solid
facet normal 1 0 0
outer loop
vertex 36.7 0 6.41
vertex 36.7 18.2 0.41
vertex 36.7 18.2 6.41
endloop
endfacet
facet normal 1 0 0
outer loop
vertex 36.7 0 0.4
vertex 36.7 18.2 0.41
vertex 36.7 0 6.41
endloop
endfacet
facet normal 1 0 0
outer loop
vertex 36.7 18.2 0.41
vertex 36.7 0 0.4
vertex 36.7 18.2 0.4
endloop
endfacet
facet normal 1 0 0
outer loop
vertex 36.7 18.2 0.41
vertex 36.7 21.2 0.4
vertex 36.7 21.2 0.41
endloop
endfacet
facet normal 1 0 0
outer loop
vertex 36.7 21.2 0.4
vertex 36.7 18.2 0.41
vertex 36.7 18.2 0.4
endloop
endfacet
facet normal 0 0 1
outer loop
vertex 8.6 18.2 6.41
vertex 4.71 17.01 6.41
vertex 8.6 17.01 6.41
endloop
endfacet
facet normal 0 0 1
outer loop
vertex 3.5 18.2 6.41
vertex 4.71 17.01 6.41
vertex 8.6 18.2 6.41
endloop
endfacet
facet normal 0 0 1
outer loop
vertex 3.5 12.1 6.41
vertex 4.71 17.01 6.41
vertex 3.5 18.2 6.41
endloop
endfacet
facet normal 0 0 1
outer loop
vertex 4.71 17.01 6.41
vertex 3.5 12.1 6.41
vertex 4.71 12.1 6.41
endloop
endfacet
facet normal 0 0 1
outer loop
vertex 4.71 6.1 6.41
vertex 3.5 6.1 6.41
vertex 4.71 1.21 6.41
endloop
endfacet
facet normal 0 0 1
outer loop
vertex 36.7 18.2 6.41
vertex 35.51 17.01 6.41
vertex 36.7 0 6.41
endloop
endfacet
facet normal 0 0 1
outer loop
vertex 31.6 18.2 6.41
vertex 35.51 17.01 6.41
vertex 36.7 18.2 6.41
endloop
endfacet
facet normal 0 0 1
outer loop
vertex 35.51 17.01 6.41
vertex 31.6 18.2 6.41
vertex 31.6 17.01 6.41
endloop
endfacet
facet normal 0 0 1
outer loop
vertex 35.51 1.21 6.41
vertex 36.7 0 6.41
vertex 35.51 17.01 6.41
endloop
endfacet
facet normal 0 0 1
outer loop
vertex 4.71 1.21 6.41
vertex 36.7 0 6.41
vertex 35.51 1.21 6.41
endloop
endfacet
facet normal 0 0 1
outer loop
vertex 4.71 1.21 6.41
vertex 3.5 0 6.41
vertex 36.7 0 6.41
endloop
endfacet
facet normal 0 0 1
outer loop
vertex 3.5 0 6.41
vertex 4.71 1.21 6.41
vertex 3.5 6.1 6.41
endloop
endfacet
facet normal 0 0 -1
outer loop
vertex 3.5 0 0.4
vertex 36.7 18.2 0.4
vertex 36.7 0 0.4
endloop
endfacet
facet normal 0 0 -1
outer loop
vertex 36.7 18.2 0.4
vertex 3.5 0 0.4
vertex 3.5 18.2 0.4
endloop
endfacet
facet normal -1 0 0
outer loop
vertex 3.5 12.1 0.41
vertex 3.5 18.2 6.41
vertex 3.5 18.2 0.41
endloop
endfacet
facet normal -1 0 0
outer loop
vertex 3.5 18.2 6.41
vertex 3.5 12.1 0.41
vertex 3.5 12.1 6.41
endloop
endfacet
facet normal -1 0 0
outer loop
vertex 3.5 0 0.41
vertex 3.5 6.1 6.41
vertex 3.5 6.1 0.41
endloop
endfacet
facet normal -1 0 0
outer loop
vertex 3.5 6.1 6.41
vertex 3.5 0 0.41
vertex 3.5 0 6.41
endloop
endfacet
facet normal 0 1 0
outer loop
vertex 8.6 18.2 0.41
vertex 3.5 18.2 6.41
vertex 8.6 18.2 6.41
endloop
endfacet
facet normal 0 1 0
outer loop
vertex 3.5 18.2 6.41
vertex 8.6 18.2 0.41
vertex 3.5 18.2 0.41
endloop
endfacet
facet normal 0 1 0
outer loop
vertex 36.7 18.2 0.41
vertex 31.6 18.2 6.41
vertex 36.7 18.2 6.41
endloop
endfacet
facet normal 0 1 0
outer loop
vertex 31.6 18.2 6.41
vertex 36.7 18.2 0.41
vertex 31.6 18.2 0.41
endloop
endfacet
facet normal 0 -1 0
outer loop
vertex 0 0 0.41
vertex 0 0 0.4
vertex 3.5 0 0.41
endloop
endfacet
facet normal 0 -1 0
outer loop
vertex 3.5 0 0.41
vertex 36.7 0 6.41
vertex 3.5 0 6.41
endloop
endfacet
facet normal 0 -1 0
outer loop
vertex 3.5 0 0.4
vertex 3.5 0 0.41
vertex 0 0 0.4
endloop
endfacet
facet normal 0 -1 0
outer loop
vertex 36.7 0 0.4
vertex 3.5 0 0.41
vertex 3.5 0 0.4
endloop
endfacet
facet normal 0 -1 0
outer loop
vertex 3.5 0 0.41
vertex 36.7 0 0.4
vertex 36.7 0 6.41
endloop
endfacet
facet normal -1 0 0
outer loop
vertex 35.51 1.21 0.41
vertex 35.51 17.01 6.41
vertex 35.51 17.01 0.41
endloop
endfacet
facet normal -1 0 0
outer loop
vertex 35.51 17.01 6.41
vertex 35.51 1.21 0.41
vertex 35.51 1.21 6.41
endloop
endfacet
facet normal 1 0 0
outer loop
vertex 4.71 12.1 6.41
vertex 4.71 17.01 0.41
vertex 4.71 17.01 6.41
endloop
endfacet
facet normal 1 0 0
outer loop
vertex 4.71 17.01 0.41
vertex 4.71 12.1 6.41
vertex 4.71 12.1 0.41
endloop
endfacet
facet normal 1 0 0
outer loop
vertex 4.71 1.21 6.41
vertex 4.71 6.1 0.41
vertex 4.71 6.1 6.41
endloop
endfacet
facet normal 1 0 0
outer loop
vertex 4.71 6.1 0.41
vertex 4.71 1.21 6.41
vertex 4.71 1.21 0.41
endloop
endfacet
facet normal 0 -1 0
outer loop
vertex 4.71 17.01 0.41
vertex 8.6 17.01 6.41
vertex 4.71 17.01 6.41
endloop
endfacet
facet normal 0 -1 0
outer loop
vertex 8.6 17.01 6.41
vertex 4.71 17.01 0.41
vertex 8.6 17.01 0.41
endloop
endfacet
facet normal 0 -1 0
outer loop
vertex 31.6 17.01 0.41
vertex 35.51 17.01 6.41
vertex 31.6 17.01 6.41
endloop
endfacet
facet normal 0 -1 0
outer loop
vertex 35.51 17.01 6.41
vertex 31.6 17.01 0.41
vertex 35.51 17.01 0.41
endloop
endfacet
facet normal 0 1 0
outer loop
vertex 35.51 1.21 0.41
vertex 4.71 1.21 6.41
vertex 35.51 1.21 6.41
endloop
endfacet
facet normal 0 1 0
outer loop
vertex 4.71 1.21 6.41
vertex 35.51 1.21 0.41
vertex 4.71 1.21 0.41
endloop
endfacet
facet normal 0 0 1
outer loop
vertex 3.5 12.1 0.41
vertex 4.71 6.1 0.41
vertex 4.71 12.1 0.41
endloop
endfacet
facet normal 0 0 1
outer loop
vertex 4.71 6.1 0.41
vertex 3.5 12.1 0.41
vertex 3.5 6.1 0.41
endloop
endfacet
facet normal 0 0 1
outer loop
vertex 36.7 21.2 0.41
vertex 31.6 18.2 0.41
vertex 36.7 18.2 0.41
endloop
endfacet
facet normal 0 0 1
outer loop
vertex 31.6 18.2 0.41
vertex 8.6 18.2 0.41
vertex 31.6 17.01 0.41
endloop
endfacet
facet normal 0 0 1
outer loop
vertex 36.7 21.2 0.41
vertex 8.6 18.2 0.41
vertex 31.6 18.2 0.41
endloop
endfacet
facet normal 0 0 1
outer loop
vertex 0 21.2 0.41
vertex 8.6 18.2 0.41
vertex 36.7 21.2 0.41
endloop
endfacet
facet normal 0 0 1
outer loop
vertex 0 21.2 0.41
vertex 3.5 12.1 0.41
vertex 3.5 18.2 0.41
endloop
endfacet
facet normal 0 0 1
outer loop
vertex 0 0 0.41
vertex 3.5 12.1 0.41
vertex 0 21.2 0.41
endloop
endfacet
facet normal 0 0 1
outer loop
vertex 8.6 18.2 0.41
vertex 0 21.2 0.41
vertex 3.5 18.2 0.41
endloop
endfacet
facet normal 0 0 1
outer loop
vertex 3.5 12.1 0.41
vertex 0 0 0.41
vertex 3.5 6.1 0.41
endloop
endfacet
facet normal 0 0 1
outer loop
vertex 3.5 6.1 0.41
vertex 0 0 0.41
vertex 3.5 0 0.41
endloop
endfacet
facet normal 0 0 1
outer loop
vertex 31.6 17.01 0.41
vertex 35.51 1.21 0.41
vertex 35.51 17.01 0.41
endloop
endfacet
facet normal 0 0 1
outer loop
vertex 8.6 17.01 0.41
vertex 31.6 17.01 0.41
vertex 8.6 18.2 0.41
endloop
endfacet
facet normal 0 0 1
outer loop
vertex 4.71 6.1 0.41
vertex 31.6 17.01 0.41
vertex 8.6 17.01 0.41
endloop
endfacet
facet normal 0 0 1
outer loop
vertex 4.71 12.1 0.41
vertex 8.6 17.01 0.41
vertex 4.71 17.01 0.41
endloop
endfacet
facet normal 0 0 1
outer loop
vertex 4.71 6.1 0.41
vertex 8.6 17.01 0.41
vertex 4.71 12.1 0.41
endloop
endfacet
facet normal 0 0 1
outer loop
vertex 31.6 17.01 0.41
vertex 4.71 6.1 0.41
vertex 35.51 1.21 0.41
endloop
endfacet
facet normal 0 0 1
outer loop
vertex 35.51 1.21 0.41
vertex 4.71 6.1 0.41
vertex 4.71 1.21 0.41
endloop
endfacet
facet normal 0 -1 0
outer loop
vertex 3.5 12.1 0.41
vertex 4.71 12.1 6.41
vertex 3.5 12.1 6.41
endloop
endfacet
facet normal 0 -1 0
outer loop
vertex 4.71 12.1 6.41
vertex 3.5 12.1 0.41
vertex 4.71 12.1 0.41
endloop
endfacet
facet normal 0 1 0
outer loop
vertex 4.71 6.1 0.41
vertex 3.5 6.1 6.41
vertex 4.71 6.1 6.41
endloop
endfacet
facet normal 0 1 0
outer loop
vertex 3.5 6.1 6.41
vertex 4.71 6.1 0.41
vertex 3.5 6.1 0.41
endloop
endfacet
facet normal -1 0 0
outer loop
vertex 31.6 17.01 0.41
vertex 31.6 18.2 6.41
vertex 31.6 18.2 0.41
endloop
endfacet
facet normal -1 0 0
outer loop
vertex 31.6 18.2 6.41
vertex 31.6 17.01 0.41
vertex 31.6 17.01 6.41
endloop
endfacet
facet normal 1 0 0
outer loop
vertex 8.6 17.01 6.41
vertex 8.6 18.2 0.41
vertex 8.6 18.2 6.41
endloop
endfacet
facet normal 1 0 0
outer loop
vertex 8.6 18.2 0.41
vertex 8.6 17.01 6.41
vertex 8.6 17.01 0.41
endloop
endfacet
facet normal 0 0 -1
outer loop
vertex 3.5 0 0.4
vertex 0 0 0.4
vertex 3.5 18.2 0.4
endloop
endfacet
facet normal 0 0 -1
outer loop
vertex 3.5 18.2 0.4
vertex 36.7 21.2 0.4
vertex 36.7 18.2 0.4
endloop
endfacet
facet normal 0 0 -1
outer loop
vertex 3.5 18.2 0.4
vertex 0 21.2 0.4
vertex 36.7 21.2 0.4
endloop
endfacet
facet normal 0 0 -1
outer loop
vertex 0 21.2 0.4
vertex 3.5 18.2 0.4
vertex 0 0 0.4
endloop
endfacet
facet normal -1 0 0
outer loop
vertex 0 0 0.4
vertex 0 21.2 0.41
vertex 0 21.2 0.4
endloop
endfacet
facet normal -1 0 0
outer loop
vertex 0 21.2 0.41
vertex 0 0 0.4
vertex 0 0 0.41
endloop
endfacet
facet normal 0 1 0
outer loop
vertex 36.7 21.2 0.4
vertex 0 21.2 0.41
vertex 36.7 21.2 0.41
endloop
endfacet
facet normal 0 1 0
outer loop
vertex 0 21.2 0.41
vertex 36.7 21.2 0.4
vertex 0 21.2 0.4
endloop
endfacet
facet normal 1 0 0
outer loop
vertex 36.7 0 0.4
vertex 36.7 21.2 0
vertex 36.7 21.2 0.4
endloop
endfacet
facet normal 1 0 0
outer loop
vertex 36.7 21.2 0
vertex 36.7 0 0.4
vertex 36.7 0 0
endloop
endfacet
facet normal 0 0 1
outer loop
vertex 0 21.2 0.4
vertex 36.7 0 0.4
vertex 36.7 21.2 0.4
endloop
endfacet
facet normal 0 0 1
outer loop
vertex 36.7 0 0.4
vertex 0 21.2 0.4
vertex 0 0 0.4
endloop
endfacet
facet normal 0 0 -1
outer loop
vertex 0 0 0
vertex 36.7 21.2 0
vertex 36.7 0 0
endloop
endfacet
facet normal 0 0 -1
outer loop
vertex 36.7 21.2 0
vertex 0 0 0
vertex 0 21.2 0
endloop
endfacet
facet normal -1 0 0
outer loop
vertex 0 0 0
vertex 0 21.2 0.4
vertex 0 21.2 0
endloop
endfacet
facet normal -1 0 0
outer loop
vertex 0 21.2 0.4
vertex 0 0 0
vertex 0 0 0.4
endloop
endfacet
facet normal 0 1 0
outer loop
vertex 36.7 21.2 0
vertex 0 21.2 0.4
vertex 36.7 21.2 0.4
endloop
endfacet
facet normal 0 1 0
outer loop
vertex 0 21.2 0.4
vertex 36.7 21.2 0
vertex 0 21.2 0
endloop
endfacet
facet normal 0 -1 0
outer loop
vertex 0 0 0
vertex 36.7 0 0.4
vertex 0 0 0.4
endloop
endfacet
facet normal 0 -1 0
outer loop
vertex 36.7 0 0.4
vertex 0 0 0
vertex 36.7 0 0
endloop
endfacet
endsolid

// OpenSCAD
// file: ../../Base/Boxes.scad
// Fischertechnik Box Foundation
// Pre-designed Boxes

use <Constants.scad>

include <PlacementOptions.scad>

box190Width = 190;
box190Depth = 130;
box130Width = 130;
box130Depth = 95;

// Values are from an original ec3 box
topBottomDifference = 1.5;
outerHeight = 40;
baseThickness = 1.8;
innerHeight = outerHeight - baseThickness;
stackExcess = 5.7;
radius = 3.5;
wallThickness = 1.5;
tolerance = 0.2;

boxWallThickness = wallThickness;
boxBaseThickness = baseThickness;
boxWebWidth = 3.0;

// getBoxWallThickness()
// Gets the wall thickness of a Fischertechnik Box
function getBoxWallThickness() = boxWallThickness;

// getBoxUsageHeight(height = 38.2)
// Gets the usable height of a Fischertechnik box
// height = Outer height of the box from the bottom to the upper edge.
function getBoxUsageHeight(height = outerHeight) = height - baseThickness - stackExcess;

// getBoxInnerHeight()
// Gets the inner height of a Fischertechnik box, including the stack excess
function getBoxInnerHeight() = innerHeight;

// getBoxBaseThickness()
// Gets the thickness of the Fischertechnik box base.
function getBoxBaseThickness() = boxBaseThickness;

// getBoxWebWidth()
// Gets the width of a box web
function getBoxWebWidth() = boxWebWidth;

// getBox190Space()
// Gets the usable inner space of a Box 190 as an x/y-list
function getBox190Space() = [
    box190Width - 2*getBoxWallThickness() - topBottomDifference, 
    box190Depth - 2*getBoxWallThickness() - topBottomDifference ];

// RoundedCornerPlate(width, depth, height, radius)
// Creates a body plate with rounded corners for a box. Used
// also to create the complete box with the hull module.
// width = Width of the plate
// depth = depth of the plate 
// height = thickness of the plate
// radius = radius of the rounded corner
module RoundedCornerPlate(width, depth, height, radius) {
    translate([radius, radius])
    hull() {
        w = width-2*radius;
        d = depth-2*radius;
        cube([w, d, height]);
        cylinder(height, r=radius, $fn=getFragments());
        translate([w, 0])
            cylinder(height, r=radius, $fn=getFragments());
        translate([w, d])
            cylinder(height, r=radius, $fn=getFragments());
        translate([0, d])
            cylinder(height, r=radius, $fn=getFragments());
    }
}

// BoxBase(width, depth)
// Creates an empty stackable Fischertechnik compatible box
// width = Outer width of the box (190, 130, ...)
// depth = Outer depth of the box (130, 95, ...)

module BoxBase(width, depth, height=outerHeight) {    
    thinPlate = 0.01;

    innerHeight = height - baseThickness;    
    
    module Body(tolerance=tolerance) {
        hull() {
            // Bottom with tolerance to fit into the original boxes when stacked
            translate([-wallThickness+tolerance, -wallThickness+tolerance, -baseThickness])
                RoundedCornerPlate(width-topBottomDifference-2*tolerance, depth-topBottomDifference-2*tolerance, thinPlate, radius);
            
            // Top
            translate([-wallThickness-topBottomDifference/2, -wallThickness-topBottomDifference/2, innerHeight-thinPlate])
                RoundedCornerPlate(width, depth, thinPlate, radius);
         }
    }

    module Cutoff() {
        hull() {
            coWidth = width - 2*wallThickness;
            coDepth = depth - 2*wallThickness;
            
            // Bottom
            RoundedCornerPlate(coWidth-topBottomDifference, coDepth-topBottomDifference, thinPlate, radius);

            // Top
            translate([-topBottomDifference/2, -topBottomDifference/2, innerHeight+thinPlate]) 
                RoundedCornerPlate(coWidth, coDepth, thinPlate, radius);
        }
    }
    
    difference() {        
        Body();
        Cutoff();
        stackOffset = innerHeight - stackExcess;
        translate([0, 0, stackOffset + baseThickness])
            Body(tolerance=0);
    }
}

// Creates the Fischertechnik empty box 130x190 mm and places it at position 0,0
// 190x130 are the outer sizes, the inner space is slightly smaller. Use getBox190Space() to get the inner sizes.
// The box is positioned that the usable inner space is at the 0,0,0 position.

module Box190() {
    BoxBase(box190Width, box190Depth);
}

// Gets the usable inner space of a Box 130 as an x/y-list
function getBox130Space() = [
    box130Width - 2*getBoxWallThickness() - topBottomDifference, 
    box130Depth - 2*getBoxWallThickness() - topBottomDifference ];

// Creates the Fischertechnik empty box 95x130 mm and places it at position 0,0
// 190x130 are the outer sizes, the inner space is slightly smaller. Use getBox190Space() to get the inner sizes.
// The box is positioned that the usable inner space is at the 0,0,0 position.

module Box130() {
    BoxBase(box130Width, box130Depth);
}

// Creates a web at the specified box walls
// corner 0 = LowerLeft, 1 = UpperLeft, 2 = UpperRight, 3 = LowerRight
// side 0 = LeftOfCorner, 1 = RightOfCorner
// distance = Distance in mm from the corner
// boxSpace = inner width and depth of the box (default: Box 190)
// webWidth = length of the web (default is 3 mms)
// webThickness = thickness of the web (default is 1 mm)
// height = Height of the web (standard is getBoxUsageHeight())

module BoxWeb(corner, side, distance, boxSpace=getBox190Space(), webWidth=getBoxWebWidth(), webThickness=1.0, height=getBoxUsageHeight()) {
    sink = getBoxWallThickness()/2;

    width = (corner % 2 == 0) ? 
            (side == LeftOfCorner ? webWidth : webThickness) :
            (side == LeftOfCorner ? webThickness : webWidth);

    depth = (corner % 2 == 0) ? 
            (side == RightOfCorner ? webWidth : webThickness) :
            (side == RightOfCorner ? webThickness : webWidth);
    
    xDiff = corner == LowerLeft ? 
                (side == LeftOfCorner ? -sink : distance) :
            (corner == UpperLeft ?                
                (side == LeftOfCorner ? distance : -sink) :
            (corner == UpperRight ?
                (side == LeftOfCorner ? boxSpace.x-webWidth+sink : boxSpace.x-distance-webThickness) :
                (side == LeftOfCorner ? boxSpace.x-distance-webThickness: boxSpace.x-webWidth+sink)));

    yDiff = corner == LowerLeft ? 
                (side == RightOfCorner ? -sink : distance) :
            (corner == UpperLeft ?
                (side == RightOfCorner ? boxSpace.y-distance-webThickness : boxSpace.y-webWidth+sink) :
            (corner == UpperRight ?
                (side == RightOfCorner ? boxSpace.y-webWidth+sink : boxSpace.y-distance-webThickness) :
                (side == RightOfCorner ? distance : -sink)));
    
    translate([xDiff, yDiff, -getExcess()])
        cube([width, depth, height + 2*getExcess()]);
}
// file: ../../Base/Rotation.scad
// Fischertechnik Box Foundation
// Geometry Helpers Rotation

include <PlacementOptions.scad>

// getRotatedSpace(space, rotation=NoRotation)
// Rotates the space dependent on the specified rotation

function getRotatedSpace(space, rotation=NoRotation) = [
    (rotation == Rotate90 || rotation == Rotate270) ? space.y : space.x,
    (rotation == Rotate90 || rotation == Rotate270) ? space.x : space.y
];

// Rotates the given space around the fixed left lower corner
// space = the space the children needs as width/depth list [width,depth]
// rotation = 0 Rotate0 degrees, 1 Rotate90 degrees, 2 Rotate180 degrees, 3 Rotate270 degrees (equivalent to -90)

module RotateFix(space, rotation=NoRotation) {
    dy = (rotation == Rotate0 || rotation == Rotate270) ? 0 :
        (rotation == Rotate90) ? space.x :
        space.y;
    dx = (rotation < Rotate180) ? 0 :
        (rotation == Rotate180) ? space.x :
        space.y;
    
    translate([dx, dy, 0])
        rotate([0, 0, rotations[rotation]])
            children();
}
// file: ../../Base/Alignment.scad
// Fischertechnik Box Foundation
// Geometry Helpers Alignment

include <PlacementOptions.scad>

// getAlignedX(elementWidth, spaceWidth, align=AlignRight, offset=0)
// Gets the aligned X offset of an element with the given
// width in the given space.
// elementWidth = The width of the element to positon
// spaceWidth = The space where the element should be aligned
// align = 0 AlignLeft, 1 AlignCenter, 2 AlignRight
// offset = an optional offset from the aligned position. When
// aligned left or centered, then positive values are in X direction.
// When aligned right then positive values are in negative X direction.

function getAlignedX(elementWidth, spaceWidth, align=AlignRight, offset=0) =
    (align == AlignLeft) ?
        offset :
        ((align == AlignCenter) ?
        (spaceWidth - elementWidth)/2 + offset :
        spaceWidth - offset - elementWidth);

// getAlignedY(elementDepth, spaceDepth, align=AlignTop, offset=0)
// Gets the aligned Y offset of an element with the given
// depth in the given space.
// elementDepth = The depth of the element to positon
// spaceDepth = The space where the element should be aligned
// align = 0 AlignBottom, 1 AlignCenter, 2 AlignTop
// offset = an optional offset from the aligned position. When
// aligned bottom or centered, then positive values are in Y direction.
// When aligned top then positive values are in negative Y direction.

function getAlignedY(elementDepth, spaceDepth, align=AlignTop, offset=0) =
    (align == AlignBottom) ?
        offset :
        ((align == AlignCenter) ?
        (spaceDepth - elementDepth)/2 + offset :
        spaceDepth - offset - elementDepth);
// file: ../../Base/PlacementOptions.scad
// Fischertechnik Box Foundation
// Placement Options

// Alignment
NoAlign = 0;
AlignLeft = 1;
AlignBottom = 2;
AlignCenter = 3;
AlignRight = 4;
AlignTop = 5;

// Element rotation degree steps
rotations = [0, -90, -180, -270];

// Rotation
NoRotation = 0;
Rotate0 = 0;
Rotate90 = 1;
Rotate180 = 2;
Rotate270 = 3;

// Docking (seen from above)
NoDock = -1;
DockLeft = 0;
DockTop = 1;
DockRight = 2;
DockCorner = 2;
DockBottom = 3;

// Web corners
LowerLeft = 0;
UpperLeft = 1;
UpperRight = 2;
LowerRight = 3;

// Web position relative to corner
LeftOfCorner = 0;
RightOfCorner = 1;
// file: ../../Base/Placement.scad
// Fischertechnik Box Foundation
// Geometry Helpers Placement

use <Constants.scad>
use <Alignment.scad>
use <Rotation.scad>
use <Boxes.scad>

include <PlacementOptions.scad>

// Place(x=0, y=0, elementSpace=[0,0], alignX=AlignLeft, alignY=AlignBottom, rotation=Rotate0, boxSpace=getBox190Space())
// Places the child at the specified position
// y = Y-Position. This is a relative position when an X aligment is specified.
// x = X-Position. This is a relative position when an Y aligment is specified.
// elementSpace = space of the element to be placed [x,y]
// alignX = -1=NoAlign, 0 AlignLeft, 1 AlignCenter, 3 AlignRight (elementSpace and boxSpace required!)
// alignY = -1=NoAlign, 2 AlignBottom, 1 AlignCenter, 4 AlignTop (elementSpace and boxSpace required!)
// rotation = 0 Rotate0 0 degrees, 1 Rotate90 90 degrees, 
// 2 Rotate180 180 degrees, 3 Rotate270 270 degrees (equivalent to -90)
// boxSpace = Inner space of the box where the placement occurs [x,y] - default is Box 190x130 inner space

module Place(x=0, y=0, elementSpace=[0,0], 
  alignX=AlignLeft, alignY=AlignBottom, 
  rotation=NoRotation, boxSpace=getBox190Space()) {

    module Position(x, y, space, rotation=Rotate0) {
        translate([x, y, 0])
            RotateFix(space, rotation)
                children();
    }

    space = getRotatedSpace(elementSpace, rotation);
    alignedX = getAlignedX(space.x, boxSpace.x, alignX, x);
    alignedY = getAlignedY(space.y, boxSpace.y, alignY, y);
    Position(alignedX, alignedY, elementSpace, rotation)
        children();
}

// Center(space=getBox130Space(), elementSpace=[0,0])
// space = Space where the children is centered. For cylinder use centered=true and no elementSpace.
// elementSpace = space of the element to be centered [x,y]

module Center(space=getBox190Space(), elementSpace=[0,0]) {
    Place(elementSpace=elementSpace, boxSpace=space, alignX=AlignCenter, alignY=AlignCenter)
        children();
}

// CenterHorizontal(width=0, y=0, offset=0, space=getBox130Space())
// width = Width of the element to be placed.
// y = Y position of the element
// offset = Offset from the center position (negative will be left of the center)
// space = Space where the element is placed

module CenterHorizontal(width=0, y=0, offset=0, space=getBox190Space()) {
    Place(x=offset, y=y, elementSpace=[width, 0], boxSpace=space, alignX=AlignCenter)
        children(0);
}

// CenterVertical(depth=0, x=0, offset=0, space=getBox130Space())
// depth = Depth of the element to be placed.
// x = X position of the element
// offset = Offset from the center position (negative will be down of the center)
// space = Space where the element is placed

module CenterVertical(depth=0, x=0, offset=0, space=getBox190Space()) {
    Place(x=x, y=offset, elementSpace=[0, depth], boxSpace=space, alignY=AlignCenter)
        children(0);
}

// getIsVertical(align)
// True if the specified alignment needs a vertical orientation for a divider (AlignRight, AlignLeft)

function getIsVertical(align) = (align == AlignRight || align == AlignLeft);

// getIsHorizontal(align)
// True if the specified alignment needs a horizontal orientation for a divider (AlignTop, AlignBottom)

function getIsHorizontal(align) = (align == AlignTop || align == AlignBottom);
// file: ../../Elements/AxisClip10.scad
// Fischertechnik Box Library
// Axis for clip 10
// 31023

use <../ModelBase/Simple.scad>
use <../Base/Constants.scad>

/* [Element Parameters] */
height = 23;
clipHeight = 10;

/* [Hidden] */
width = 12;
depth = 12;
upperDiameter = 3.6;

// getAxisClip10Space()
// Gets the space of a n axis for a clip 10 with spring ring (mot2)

function getAxisClip10Space() = [width, depth, height];

// AxisClip10(height, clipHeight)
// Axis for clip 10 with spring ring (mot2)
// height = Height of the complete axis (standard is 23, in mot3 its only 12)
// clipHeight = Height of the part for the clip (standard is 10, in mot3 its only 7)

module AxisClip10(height=height, clipHeight=clipHeight) {
    LeveledAxisWithSpace(height, height-clipHeight, getAxisClip10Space(), diameter=upperDiameter);
}

// Test
color("lightgray")
AxisClip10(height, clipHeight);
// file: ../../Base/Constants.scad
// Fischertechnik Box Foundation
// Constants

// Constant values necessary for multiple elements

// Base constants
dividerThickness = 1.2;
excess = 0.01;
fragments = 90;
tolerance = 0.8;

// Gets the thickness of a divider 
function getDividerThickness() = dividerThickness;

// Gets the excess that is used to merge walls into each other
function getExcess() = excess;

// Gets amount of fragments of a cylinder
function getFragments() = fragments;

// Gets the inner tolerance of a frame to each side
function getTolerance() = tolerance;


// Fischertechnik specific constants
axisDiameter = 4;
axisBottomDiameter = axisDiameter + 1;
axisTolerance = 0.2;

// Gets axis diameter of Fischertechnik axis
function getAxisDiameter() = axisDiameter;

// Gets axis diameter tolerance (subtracted for element axis)
function getAxisTolerance() = axisTolerance;

// Gets the axis diameter for standing axis
function getStandAxisDiameter() = getAxisDiameter() - getAxisTolerance();

// Gets axis bottom diameter for thicker part at the bottom
function getAxisBottomDiameter() = axisBottomDiameter;

standardEdgeDistance = 2.5;
standardWebDistance = 11.5;
standardCornerLength = 15;

// gets the standard distance to the wall of the box for dockable frames with webs
function getStandardEdgeDistance() = standardEdgeDistance;

// gets the standard distance of each web to the corner of the dockable frame
function getStandardWebDistance() = standardWebDistance;

// gets the standard length of the corner walls of a dockable frame
function getStandardCornerLength() = standardCornerLength;

tubeWallFactor = 0.8;

// gets the wall thickness of a tube.
function getTubeWallThickness() = tubeWallFactor * getDividerThickness();

smallPartsFrameHeight = 20;

// gets the frame height for docked small parts boxes.
function getSmallPartsFrameHeight() = smallPartsFrameHeight;

hubRingDiameter = 19.5;
hubRingLevelDiameter = 21;

// gets the diameter of a tube matching the inner ring of a wheel
function getHubRingDiameter() = hubRingDiameter;

// gets the diameter of a hub tube with a thicker diameter
function getHubRingLevelDiameter() = hubRingLevelDiameter;
// file: ../../Elements/FrameUFormGearbox.scad
// Fischertechnik Box Library
// Frame for U form gearbox
// 31068, 31078

use <../Base/Constants.scad>
use <../Base/Placement.scad>
use <../ModelBase/Simple.scad>

include <../Base/PlacementOptions.scad>

/* [Hidden] */
width = 30;
depth = 15;
height = 6;
pinDepth = 3.5;
gearDepth = 3;

volume = [width, depth, height];

// getFrameUFormGearboxSpace()
// Gets the space for a U form gearbox including the pin and gear extension

function getFrameUFormGearboxSpace() = getFrameOuterVolume([width + pinDepth, depth + gearDepth, height]);

// FrameUFormGearbox()
// Frame for U form gearbox

module FrameUFormGearbox() {
    Space(getFrameUFormGearboxSpace());
    translate([pinDepth, 0]) {
        difference() {
            Frame([width, depth, height]);
            pinCutoff = 6;            
            translate([-getDividerThickness()/2, (getFrameOuterVolume(volume).y - pinCutoff)/2])
                cube([2*getDividerThickness(), pinCutoff, height + getExcess()]);
            gearCutoff = pinCutoff + width/2 + 2;
            translate([(getFrameOuterVolume(volume).x - gearCutoff)/2, getFrameOuterVolume(volume).y - 1.5*getDividerThickness(), ])
                cube([gearCutoff, 2*getDividerThickness(), height + getExcess()]);
        }
    }
}

// test
color("lightgray")
FrameUFormGearbox();
// file: ../TestPrint.scad
// 3D Print Test Base

use <../Base/Constants.scad>

use <../Elements/AxisClip10.scad>

module TestPrint(elementSpace) {
    cube([elementSpace.x, elementSpace.y, 0.4]);
    translate([0,0,0.4+getExcess()]) {
        children();
    }
}

TestPrint(getAxisClip10Space())
    AxisClip10();
// main file
// 3D Print Test
// FrameUFormGearbox

use <../TestPrint.scad>
use <../../Elements/FrameUFormGearbox.scad>

TestPrint(getFrameUFormGearboxSpace())
    FrameUFormGearbox();
